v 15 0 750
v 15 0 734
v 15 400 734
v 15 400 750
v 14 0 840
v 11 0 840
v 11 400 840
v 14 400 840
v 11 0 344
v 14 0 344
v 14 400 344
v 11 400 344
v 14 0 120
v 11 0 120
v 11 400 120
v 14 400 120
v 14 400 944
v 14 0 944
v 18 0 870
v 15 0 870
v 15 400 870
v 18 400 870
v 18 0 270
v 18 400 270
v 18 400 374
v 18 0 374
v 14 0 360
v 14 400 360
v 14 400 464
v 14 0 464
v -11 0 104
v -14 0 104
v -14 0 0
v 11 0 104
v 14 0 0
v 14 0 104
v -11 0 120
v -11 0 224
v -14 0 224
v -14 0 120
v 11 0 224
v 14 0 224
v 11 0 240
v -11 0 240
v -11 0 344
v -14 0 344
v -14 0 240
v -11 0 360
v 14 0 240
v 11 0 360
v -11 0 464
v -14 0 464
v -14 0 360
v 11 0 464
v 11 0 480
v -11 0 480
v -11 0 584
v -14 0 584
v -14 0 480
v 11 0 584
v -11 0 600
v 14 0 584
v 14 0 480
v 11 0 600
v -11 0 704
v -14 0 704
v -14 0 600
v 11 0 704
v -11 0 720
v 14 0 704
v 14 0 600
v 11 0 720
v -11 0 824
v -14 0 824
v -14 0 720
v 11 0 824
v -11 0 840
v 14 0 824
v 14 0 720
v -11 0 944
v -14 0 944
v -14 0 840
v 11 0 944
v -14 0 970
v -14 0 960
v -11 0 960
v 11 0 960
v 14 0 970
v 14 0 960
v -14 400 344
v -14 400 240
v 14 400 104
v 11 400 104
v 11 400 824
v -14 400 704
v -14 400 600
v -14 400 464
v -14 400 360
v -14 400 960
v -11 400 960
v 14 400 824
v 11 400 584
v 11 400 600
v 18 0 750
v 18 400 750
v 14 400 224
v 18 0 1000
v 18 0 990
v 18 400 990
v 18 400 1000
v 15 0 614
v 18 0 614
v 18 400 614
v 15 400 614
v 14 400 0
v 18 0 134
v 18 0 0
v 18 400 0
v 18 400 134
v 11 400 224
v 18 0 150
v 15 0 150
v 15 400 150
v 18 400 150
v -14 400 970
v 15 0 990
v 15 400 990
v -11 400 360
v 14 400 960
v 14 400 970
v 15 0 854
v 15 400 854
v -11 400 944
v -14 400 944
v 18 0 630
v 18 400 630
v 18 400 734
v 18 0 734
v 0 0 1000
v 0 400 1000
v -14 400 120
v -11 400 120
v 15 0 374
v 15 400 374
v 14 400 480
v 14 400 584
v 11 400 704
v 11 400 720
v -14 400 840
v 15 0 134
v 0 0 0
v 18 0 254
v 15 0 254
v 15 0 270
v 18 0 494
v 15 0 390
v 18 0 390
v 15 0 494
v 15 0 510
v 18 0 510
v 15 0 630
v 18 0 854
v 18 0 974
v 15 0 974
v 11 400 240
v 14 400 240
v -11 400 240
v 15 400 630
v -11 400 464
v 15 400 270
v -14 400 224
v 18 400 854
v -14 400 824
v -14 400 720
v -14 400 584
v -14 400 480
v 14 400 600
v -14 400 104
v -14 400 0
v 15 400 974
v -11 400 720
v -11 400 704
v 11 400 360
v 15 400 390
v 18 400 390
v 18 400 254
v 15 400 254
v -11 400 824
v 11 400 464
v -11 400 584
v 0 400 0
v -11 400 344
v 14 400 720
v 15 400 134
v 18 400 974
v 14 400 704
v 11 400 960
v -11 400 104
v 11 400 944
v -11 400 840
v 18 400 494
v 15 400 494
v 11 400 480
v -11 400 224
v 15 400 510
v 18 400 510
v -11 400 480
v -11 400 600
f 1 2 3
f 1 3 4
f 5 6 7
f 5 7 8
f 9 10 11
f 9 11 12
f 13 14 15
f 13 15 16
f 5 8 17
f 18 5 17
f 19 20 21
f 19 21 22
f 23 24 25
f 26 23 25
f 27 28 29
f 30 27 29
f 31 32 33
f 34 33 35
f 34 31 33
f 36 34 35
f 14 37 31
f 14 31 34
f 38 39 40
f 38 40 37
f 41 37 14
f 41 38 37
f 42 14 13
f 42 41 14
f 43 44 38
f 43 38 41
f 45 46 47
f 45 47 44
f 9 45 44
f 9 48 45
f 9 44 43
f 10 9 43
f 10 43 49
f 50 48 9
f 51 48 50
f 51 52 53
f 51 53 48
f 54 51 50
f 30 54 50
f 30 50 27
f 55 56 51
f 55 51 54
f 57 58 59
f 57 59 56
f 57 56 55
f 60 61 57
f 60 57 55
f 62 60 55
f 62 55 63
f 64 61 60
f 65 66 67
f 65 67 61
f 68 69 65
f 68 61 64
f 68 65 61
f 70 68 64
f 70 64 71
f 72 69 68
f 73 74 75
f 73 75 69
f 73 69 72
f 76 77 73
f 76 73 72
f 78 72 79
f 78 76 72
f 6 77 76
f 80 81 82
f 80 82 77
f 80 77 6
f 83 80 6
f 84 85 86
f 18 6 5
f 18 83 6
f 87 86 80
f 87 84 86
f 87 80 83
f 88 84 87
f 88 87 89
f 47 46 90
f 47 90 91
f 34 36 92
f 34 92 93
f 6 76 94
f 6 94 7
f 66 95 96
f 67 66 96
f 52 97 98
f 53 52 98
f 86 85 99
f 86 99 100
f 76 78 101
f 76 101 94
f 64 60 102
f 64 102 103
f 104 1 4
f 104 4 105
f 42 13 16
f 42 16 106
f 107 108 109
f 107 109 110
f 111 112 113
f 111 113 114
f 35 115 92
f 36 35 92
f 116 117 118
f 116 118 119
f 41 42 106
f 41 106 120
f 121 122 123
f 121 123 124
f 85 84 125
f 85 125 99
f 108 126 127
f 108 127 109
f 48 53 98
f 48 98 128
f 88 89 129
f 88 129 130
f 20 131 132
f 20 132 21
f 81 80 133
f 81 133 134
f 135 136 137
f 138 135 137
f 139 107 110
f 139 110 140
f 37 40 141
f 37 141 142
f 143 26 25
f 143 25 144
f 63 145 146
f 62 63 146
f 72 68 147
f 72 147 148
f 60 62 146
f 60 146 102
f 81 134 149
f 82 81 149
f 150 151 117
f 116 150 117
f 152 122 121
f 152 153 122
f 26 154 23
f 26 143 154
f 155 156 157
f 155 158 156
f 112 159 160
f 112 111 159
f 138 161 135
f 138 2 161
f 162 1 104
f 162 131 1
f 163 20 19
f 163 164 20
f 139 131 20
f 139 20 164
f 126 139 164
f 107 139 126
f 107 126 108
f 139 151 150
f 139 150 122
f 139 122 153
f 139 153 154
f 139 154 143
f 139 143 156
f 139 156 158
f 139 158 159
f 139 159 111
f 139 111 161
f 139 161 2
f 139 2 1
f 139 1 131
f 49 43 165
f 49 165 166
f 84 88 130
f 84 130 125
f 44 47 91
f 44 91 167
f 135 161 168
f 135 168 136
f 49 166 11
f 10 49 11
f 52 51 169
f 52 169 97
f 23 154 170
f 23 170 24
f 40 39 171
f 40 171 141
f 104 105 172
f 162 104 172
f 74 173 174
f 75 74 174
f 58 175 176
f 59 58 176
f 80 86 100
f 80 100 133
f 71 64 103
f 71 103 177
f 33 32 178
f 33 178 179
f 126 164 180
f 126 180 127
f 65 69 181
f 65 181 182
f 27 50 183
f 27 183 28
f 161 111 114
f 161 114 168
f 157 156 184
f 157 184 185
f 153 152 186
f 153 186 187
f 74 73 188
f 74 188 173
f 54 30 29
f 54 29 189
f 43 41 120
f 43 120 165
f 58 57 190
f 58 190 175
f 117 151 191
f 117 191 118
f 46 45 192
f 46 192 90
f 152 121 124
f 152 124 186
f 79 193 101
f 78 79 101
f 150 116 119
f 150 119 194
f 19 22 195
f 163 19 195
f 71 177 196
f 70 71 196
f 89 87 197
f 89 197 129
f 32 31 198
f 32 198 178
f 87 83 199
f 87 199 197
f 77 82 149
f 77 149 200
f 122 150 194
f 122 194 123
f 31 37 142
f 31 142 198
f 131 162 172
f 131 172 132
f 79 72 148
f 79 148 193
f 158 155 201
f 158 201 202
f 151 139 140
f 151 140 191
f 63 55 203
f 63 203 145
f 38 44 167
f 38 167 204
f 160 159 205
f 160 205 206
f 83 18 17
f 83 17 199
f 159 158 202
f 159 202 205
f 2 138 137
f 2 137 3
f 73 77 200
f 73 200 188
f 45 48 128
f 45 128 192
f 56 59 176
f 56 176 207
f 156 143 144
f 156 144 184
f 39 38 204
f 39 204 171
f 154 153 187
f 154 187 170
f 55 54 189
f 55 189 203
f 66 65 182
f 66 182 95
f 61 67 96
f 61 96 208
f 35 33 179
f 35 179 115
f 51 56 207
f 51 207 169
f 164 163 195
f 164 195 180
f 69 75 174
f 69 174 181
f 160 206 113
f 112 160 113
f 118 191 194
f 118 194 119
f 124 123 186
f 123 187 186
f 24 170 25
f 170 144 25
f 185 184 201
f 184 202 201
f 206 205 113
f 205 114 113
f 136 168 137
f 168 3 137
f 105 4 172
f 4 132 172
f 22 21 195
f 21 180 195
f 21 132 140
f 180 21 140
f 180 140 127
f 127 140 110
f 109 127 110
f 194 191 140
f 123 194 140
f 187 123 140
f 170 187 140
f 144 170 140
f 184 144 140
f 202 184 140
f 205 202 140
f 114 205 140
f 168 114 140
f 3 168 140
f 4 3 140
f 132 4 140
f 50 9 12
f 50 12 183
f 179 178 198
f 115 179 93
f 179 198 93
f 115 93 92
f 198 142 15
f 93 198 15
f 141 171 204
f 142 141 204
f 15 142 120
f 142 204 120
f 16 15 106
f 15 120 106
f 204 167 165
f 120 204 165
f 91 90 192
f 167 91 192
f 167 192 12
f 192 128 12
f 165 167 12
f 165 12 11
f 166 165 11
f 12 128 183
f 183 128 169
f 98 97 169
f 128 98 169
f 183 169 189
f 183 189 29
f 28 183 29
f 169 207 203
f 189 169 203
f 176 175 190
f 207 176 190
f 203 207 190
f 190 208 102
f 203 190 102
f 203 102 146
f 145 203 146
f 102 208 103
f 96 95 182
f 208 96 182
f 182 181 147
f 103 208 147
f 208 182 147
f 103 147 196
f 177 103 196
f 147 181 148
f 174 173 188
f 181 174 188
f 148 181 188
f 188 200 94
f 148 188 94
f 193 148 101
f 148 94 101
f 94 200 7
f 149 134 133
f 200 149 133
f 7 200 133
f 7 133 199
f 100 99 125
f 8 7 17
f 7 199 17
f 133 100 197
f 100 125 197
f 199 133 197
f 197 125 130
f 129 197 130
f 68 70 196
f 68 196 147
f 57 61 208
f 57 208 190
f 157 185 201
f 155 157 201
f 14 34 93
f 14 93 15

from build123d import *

# Parameters (mm, degrees)
F1_DEPTH = 400
F3_DEPTH = 400


with BuildPart() as f1:
    # F0 (on Front) → F1 (new body)
    with BuildSketch(Plane.XZ):
        Polygon((0, 1000), (0, 0), (18, 0), (18, 30), (18, 134), (15, 134), (15, 150), (18, 150), (18, 254), (15, 254), (15, 270), (18, 270), (18, 374), (15, 374), (15, 390), (18, 390), (18, 494), (15, 494), (15, 510), (18, 510), (18, 614), (15, 614), (15, 630), (18, 630), (18, 734), (15, 734), (15, 750), (18, 750), (18, 854), (15, 854), (15, 870), (18, 870), (18, 974), (15, 974), (15, 990), (18, 990), (18, 1000), align=None)
    extrude(amount=-F1_DEPTH)


with BuildPart() as f3:
    # F2 (on Front) → F3 (new body)
    with BuildSketch(Plane.XZ):
        Polygon((14, 970), (0, 970), (-14, 970), (-14, 960), (-11, 960), (-11, 944), (-14, 944), (-14, 840), (-11, 840), (-11, 824), (-14, 824), (-14, 720), (-11, 720), (-11, 704), (-14, 704), (-14, 600), (-11, 600), (-11, 584), (-14, 584), (-14, 480), (-11, 480), (-11, 464), (-14, 464), (-14, 360), (-11, 360), (-11, 344), (-14, 344), (-14, 240), (-11, 240), (-11, 224), (-14, 224), (-14, 120), (-11, 120), (-11, 104), (-14, 104), (-14, 0), (0, 0), (14, 0), (14, 104), (11, 104), (11, 120), (14, 120), (14, 224), (11, 224), (11, 240), (14, 240), (14, 344), (11, 344), (11, 360), (14, 360), (14, 464), (11, 464), (11, 480), (14, 480), (14, 584), (11, 584), (11, 600), (14, 600), (14, 704), (11, 704), (11, 720), (14, 720), (14, 824), (11, 824), (11, 840), (14, 840), (14, 944), (11, 944), (11, 960), (14, 960), align=None)
    extrude(amount=-F3_DEPTH)


solid = Compound([f1.part, f3.part])
